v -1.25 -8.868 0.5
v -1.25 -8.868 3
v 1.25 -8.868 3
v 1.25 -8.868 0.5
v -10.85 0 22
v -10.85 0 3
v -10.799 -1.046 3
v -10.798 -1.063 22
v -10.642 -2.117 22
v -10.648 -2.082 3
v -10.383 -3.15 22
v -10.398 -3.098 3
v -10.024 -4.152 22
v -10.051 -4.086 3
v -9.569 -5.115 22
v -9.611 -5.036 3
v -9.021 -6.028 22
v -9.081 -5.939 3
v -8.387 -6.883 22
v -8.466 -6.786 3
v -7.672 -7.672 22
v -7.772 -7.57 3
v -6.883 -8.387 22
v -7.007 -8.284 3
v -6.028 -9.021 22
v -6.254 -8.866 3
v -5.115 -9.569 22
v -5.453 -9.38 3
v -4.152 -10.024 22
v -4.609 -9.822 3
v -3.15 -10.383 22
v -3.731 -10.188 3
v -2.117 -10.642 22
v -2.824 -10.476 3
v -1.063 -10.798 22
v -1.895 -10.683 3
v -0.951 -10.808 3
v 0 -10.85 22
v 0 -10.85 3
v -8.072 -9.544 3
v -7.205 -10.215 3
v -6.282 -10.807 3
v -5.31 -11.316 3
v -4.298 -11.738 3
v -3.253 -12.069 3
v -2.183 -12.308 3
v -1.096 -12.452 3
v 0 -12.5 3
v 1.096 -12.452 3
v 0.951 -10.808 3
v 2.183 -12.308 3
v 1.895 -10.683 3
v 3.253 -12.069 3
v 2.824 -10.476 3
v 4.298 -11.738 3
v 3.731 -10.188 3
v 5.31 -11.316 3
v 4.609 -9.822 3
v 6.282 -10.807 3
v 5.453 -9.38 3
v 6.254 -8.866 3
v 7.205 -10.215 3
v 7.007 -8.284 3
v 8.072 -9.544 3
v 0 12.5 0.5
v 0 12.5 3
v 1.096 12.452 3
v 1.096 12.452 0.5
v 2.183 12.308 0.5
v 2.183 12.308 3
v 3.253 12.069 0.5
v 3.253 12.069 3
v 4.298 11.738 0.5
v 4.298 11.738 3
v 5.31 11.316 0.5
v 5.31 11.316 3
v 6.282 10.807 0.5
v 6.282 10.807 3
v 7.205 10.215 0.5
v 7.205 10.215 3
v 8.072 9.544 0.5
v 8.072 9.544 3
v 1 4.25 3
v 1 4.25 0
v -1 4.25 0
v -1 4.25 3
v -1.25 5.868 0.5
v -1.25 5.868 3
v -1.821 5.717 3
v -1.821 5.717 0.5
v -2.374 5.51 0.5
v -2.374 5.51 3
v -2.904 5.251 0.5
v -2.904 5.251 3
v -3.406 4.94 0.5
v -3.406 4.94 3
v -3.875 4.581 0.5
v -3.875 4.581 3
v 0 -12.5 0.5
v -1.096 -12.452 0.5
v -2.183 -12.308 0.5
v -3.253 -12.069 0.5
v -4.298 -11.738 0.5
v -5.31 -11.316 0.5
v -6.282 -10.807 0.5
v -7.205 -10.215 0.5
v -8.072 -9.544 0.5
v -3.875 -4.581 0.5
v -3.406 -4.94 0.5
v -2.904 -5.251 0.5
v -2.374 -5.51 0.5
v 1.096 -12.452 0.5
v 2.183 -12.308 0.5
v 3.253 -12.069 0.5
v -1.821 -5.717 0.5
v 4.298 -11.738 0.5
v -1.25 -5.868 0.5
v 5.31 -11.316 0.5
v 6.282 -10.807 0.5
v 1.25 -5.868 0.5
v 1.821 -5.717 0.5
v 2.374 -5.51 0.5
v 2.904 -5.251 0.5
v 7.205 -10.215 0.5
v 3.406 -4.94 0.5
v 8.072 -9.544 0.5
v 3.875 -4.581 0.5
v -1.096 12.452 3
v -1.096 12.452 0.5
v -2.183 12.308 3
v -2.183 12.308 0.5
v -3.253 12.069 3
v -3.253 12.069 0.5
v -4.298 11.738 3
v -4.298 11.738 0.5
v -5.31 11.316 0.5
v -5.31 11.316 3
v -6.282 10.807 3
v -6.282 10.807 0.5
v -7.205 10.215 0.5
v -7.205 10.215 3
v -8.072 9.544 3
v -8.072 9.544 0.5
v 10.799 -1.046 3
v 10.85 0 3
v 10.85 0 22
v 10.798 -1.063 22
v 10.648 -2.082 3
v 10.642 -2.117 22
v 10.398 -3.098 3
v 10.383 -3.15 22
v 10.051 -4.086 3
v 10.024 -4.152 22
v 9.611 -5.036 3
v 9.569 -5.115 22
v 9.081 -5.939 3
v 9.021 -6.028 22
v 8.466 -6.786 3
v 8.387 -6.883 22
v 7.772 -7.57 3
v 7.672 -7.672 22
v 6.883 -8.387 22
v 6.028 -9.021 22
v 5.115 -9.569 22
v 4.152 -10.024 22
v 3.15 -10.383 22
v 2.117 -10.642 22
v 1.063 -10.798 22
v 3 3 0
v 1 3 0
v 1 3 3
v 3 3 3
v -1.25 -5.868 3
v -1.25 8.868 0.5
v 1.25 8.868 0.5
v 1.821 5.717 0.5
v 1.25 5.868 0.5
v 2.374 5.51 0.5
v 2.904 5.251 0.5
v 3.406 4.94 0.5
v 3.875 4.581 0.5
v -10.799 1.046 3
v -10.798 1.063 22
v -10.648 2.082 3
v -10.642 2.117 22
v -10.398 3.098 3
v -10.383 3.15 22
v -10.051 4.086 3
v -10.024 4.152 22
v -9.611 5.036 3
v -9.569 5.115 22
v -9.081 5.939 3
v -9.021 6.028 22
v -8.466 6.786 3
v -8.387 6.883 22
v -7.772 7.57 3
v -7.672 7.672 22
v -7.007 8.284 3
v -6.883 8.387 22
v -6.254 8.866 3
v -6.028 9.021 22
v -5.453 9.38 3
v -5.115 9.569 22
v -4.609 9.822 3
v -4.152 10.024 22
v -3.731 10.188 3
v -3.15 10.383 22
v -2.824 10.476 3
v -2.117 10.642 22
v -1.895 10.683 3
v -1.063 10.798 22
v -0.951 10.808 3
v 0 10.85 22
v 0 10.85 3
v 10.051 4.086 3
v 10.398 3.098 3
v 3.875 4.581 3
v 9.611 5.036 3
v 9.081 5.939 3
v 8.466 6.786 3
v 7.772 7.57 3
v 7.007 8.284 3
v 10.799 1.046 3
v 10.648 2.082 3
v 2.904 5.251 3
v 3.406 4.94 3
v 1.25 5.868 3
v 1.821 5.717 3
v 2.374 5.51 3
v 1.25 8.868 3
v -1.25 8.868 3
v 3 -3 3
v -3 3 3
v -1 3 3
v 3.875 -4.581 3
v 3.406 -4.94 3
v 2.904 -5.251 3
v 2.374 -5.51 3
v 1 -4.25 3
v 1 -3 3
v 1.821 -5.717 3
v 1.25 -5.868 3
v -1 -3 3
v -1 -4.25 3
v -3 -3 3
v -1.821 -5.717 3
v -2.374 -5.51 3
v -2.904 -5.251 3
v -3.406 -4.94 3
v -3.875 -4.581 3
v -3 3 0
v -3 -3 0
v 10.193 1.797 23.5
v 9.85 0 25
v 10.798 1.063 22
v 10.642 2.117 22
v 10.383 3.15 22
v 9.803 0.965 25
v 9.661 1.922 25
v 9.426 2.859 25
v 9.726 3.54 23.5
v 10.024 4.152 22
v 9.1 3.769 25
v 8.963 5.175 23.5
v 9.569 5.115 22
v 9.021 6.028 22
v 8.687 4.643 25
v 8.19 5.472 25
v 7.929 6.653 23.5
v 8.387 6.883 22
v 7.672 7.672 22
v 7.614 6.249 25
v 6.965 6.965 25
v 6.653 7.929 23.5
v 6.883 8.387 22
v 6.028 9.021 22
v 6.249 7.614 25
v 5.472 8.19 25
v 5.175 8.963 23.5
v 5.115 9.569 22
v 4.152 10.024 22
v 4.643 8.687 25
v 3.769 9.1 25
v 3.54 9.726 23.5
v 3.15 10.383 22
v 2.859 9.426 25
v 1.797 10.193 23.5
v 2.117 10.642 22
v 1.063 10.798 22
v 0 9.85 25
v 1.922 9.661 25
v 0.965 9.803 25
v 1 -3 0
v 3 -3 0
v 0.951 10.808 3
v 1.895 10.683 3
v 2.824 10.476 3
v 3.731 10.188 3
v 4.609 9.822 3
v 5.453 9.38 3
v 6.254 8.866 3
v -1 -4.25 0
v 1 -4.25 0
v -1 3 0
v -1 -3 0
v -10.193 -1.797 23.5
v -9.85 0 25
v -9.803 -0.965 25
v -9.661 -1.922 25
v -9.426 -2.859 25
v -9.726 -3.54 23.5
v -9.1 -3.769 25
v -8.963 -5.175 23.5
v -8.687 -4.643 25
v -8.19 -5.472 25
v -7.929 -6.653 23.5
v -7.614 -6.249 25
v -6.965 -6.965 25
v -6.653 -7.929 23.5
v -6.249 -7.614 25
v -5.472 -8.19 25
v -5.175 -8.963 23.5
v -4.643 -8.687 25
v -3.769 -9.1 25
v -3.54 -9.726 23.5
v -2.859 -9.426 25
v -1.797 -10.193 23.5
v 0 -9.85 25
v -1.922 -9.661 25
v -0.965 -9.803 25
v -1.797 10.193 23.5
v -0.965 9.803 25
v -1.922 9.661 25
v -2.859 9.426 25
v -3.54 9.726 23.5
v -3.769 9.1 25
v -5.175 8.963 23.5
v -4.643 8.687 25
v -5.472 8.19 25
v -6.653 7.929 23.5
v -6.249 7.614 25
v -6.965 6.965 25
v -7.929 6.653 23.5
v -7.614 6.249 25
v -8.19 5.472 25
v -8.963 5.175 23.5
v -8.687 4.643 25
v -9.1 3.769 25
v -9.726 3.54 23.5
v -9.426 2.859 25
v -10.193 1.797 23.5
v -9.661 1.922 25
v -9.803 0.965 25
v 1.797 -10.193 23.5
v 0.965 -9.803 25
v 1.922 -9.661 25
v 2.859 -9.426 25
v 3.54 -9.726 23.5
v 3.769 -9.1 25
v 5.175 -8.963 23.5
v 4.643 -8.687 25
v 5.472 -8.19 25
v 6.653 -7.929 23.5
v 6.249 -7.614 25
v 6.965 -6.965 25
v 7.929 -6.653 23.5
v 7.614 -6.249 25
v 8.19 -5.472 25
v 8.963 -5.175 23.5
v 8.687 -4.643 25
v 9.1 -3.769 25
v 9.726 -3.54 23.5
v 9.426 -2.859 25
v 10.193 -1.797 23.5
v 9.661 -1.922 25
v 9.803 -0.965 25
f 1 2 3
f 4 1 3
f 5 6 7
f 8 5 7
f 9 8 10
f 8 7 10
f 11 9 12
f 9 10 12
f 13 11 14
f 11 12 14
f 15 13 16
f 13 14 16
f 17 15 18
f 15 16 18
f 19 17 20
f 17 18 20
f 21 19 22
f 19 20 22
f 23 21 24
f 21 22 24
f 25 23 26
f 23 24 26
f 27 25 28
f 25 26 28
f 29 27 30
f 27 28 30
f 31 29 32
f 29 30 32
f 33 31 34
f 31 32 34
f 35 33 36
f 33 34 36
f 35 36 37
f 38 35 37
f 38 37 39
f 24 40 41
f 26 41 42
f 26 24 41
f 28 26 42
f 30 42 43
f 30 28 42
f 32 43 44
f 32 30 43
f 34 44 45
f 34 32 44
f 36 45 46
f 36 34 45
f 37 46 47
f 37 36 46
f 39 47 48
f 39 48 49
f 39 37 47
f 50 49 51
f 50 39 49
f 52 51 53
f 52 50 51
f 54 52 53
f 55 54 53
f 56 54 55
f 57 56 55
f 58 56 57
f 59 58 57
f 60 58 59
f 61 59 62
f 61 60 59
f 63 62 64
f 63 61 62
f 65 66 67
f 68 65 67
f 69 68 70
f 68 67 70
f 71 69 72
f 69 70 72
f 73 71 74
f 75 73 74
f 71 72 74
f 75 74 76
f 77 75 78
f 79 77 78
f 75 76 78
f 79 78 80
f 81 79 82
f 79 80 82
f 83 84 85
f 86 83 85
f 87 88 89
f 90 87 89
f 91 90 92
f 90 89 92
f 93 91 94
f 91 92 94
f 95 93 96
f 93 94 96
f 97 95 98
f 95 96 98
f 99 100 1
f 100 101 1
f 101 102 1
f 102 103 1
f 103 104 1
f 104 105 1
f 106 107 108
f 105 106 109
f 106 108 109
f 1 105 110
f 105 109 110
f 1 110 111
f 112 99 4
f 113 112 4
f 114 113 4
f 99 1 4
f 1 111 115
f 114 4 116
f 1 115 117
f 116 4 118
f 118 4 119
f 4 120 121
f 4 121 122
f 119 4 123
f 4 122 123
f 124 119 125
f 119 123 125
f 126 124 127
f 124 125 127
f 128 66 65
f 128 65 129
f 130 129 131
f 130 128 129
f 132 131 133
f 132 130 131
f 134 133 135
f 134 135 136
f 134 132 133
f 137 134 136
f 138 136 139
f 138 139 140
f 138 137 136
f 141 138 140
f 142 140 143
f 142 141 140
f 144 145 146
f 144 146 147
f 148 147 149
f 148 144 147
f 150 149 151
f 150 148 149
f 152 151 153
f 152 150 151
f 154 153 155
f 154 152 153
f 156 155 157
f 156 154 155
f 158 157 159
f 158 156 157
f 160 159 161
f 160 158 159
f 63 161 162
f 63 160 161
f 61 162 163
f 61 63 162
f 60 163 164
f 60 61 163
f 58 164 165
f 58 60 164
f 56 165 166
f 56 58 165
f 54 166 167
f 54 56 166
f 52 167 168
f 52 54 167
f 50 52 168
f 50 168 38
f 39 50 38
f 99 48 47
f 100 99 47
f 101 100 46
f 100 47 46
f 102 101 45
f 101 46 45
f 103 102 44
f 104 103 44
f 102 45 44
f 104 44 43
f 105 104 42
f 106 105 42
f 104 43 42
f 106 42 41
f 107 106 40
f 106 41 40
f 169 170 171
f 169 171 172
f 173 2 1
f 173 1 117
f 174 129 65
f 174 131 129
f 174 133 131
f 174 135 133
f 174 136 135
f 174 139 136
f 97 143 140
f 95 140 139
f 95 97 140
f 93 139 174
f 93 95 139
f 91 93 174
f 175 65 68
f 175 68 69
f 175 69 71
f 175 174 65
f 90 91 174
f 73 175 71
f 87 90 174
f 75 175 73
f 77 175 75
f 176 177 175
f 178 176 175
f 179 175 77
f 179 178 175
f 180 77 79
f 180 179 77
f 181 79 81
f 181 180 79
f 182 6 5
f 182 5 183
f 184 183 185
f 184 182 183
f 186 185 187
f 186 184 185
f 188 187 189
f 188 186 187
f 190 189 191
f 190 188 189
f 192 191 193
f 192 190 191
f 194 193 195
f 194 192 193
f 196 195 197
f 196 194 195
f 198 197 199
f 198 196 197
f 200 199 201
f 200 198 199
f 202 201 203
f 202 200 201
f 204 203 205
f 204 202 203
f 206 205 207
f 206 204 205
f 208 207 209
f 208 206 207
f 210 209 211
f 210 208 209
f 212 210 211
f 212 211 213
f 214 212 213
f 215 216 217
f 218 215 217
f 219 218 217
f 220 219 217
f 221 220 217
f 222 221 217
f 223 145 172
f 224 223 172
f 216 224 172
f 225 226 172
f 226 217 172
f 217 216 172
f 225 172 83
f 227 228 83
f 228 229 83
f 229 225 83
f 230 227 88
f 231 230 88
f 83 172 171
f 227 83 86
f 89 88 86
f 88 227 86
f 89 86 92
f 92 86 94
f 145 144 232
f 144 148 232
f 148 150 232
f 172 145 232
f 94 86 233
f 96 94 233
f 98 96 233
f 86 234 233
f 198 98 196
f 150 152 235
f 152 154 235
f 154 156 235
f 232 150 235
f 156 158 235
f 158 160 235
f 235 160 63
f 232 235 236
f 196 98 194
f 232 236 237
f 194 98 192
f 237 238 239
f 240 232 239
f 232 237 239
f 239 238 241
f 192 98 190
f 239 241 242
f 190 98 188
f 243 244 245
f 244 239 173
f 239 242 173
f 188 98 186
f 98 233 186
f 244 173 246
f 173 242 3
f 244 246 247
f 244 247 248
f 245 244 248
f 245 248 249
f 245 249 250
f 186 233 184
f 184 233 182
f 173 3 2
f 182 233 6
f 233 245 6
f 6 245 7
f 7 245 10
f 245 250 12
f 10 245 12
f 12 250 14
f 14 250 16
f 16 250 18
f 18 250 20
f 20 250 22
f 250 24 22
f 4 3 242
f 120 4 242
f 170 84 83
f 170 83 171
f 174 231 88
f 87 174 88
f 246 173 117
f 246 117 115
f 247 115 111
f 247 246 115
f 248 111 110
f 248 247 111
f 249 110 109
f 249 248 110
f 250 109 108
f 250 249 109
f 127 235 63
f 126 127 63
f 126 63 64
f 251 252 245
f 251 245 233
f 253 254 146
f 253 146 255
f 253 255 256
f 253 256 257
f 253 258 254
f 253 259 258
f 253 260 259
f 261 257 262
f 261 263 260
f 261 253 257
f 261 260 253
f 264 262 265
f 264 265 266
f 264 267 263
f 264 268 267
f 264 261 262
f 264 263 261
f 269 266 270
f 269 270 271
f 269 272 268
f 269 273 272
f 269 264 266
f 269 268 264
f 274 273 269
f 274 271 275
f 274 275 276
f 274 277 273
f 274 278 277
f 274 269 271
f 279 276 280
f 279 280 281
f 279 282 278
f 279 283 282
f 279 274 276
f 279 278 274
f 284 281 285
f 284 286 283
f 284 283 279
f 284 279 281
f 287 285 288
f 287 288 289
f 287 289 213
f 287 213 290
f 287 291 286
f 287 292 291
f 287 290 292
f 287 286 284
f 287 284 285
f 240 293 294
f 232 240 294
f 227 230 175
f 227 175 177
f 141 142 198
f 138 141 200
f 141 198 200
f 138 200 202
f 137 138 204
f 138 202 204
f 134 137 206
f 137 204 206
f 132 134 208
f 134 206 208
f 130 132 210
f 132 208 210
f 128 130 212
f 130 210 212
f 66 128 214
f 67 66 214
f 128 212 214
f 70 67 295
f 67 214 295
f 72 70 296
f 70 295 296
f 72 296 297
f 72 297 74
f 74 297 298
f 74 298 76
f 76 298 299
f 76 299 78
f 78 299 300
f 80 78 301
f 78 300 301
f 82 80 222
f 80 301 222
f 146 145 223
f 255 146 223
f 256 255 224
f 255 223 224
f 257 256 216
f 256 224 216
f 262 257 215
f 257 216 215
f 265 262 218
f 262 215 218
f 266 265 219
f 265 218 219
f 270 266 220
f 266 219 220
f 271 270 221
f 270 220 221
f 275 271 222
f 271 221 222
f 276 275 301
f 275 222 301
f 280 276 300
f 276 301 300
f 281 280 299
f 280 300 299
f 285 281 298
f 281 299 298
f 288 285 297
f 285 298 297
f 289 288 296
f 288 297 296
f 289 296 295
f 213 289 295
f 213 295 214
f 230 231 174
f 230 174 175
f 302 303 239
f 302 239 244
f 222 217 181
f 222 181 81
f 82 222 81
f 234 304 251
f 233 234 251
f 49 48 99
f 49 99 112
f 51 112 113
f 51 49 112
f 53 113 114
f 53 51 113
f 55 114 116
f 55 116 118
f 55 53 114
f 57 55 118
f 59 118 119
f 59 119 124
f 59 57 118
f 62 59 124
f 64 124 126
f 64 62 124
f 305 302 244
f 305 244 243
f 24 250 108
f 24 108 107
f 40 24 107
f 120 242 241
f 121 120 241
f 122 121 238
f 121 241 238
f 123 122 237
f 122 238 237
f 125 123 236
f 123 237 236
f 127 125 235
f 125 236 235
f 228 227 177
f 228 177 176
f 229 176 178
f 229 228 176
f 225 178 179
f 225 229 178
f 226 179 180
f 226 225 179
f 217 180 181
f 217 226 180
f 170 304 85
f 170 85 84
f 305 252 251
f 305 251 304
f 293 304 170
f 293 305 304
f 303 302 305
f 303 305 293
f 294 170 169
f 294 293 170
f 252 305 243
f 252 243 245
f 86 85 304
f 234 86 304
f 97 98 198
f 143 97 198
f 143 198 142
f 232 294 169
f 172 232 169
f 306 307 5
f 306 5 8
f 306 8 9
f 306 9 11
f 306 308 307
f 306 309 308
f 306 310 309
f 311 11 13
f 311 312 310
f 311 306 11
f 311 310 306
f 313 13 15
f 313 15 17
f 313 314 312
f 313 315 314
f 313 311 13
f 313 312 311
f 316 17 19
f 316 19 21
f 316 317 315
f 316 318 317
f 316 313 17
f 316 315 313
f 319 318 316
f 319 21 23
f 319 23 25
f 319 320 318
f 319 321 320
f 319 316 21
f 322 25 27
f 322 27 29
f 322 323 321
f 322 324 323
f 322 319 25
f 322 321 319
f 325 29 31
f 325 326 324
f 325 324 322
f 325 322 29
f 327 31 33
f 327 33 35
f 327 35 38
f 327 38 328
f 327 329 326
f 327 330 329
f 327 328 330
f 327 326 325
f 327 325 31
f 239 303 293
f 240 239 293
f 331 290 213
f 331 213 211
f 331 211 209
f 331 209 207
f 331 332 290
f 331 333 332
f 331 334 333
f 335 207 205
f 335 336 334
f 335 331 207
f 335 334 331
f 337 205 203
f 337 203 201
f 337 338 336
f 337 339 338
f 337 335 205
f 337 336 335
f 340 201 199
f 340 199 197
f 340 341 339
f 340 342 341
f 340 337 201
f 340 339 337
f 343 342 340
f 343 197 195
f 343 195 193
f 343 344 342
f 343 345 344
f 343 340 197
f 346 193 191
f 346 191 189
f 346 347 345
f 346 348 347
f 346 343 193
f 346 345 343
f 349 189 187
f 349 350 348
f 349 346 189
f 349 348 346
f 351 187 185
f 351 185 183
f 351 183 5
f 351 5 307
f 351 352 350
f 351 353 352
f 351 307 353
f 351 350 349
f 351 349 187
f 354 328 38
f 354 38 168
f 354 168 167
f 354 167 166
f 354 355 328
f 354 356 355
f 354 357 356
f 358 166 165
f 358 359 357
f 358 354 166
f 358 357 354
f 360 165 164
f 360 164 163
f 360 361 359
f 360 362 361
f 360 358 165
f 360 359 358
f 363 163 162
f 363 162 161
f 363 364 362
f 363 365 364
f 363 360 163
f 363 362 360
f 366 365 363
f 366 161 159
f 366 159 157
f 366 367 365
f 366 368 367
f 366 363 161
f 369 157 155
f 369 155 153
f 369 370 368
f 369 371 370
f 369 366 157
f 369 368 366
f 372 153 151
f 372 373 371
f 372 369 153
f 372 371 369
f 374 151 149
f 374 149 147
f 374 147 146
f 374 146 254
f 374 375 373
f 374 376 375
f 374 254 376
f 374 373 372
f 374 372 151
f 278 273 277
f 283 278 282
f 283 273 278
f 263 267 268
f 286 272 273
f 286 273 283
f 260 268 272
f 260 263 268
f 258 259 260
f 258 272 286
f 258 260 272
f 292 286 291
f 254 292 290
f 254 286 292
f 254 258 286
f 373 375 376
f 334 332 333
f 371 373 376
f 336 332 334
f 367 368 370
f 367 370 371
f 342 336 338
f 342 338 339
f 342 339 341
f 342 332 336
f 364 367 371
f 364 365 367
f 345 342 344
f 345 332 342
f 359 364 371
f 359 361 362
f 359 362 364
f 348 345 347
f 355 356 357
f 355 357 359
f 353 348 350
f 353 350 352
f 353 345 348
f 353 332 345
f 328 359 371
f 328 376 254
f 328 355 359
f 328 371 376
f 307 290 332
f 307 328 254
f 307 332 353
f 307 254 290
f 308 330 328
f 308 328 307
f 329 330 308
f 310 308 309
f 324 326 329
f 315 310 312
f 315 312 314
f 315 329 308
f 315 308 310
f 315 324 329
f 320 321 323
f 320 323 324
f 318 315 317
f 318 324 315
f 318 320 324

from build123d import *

# Parameters (mm, degrees)
PAD_DEPTH               = 3
PAD001_DEPTH            = 2
PAD002_DEPTH            = 20
PAD003_DEPTH            = 2.5
PAD_MIRRORED_2_DEPTH    = 3
PAD001_MIRRORED_2_DEPTH = 2
PAD002_MIRRORED_2_DEPTH = 20
PAD003_MIRRORED_2_DEPTH = 2.5
CHAMFER_SIZE2           = 1
CHAMFER_SIZE            = 3


with BuildPart() as part:
    # Sketch → Pad (new body)
    with BuildSketch(Plane.XY):
        Polygon((0, 4.25), (1, 4.25), (1, 3), (3, 3), (3, 0), (0, 0), align=None)
    pad = extrude(amount=PAD_DEPTH)

    # Sketch001 (on Face8 of Pad) → Pad001 (join)
    with BuildSketch(Plane.XY.offset(3)):
        with BuildLine():
            ThreePointArc((10.85, 0), (7.672109, 7.672109), (0, 10.85))
            Line((0, 10.85), (0, 0))
            Line((0, 0), (10.85, 0))
        make_face()
    pad001 = extrude(amount=PAD001_DEPTH)

    # Sketch002 (on Face12 of Pad001) → Pad002 (join)
    with BuildSketch(Plane.XY.offset(5)):
        with BuildLine():
            ThreePointArc((10.85, 0), (7.672109, 7.672109), (0, 10.85))
            Line((0, 0), (0, 10.85))
            Line((0, 0), (10.85, 0))
        make_face()
    pad002 = extrude(amount=PAD002_DEPTH)

    # Sketch003 (on Face5 of Pad002) → Pad003 (join)
    with BuildSketch(Plane(origin=(0, 0, 3), x_dir=(1, 0, 0), z_dir=(0, 0, -1))):
        with BuildLine():
            ThreePointArc((1.25, -5.868347), (2.641923, -5.387044), (3.874663, -4.581156))
            Line((3.874663, -4.581156), (8.072214, -9.544074))
            ThreePointArc((0, -12.5), (4.298201, -11.737779), (8.072214, -9.544074))
            Line((0, -8.868347), (0, -12.5))
            Line((1.25, -8.868347), (0, -8.868347))
            Line((1.25, -8.868347), (1.25, -5.868347))
        make_face()
    pad003 = extrude(amount=PAD003_DEPTH)

    # Sketch Mirrored 2 → Pad Mirrored 2 (add)
    with BuildSketch(Plane(origin=(0, 0, 0), x_dir=(-1, 0, 0), z_dir=(0, 0, -1))):
        Polygon((0, 4.25), (1, 4.25), (1, 3), (3, 3), (3, 0), (0, 0), align=None)
    pad_mirrored_2 = extrude(amount=-PAD_MIRRORED_2_DEPTH)

    # Sketch001 Mirrored 2 → Pad001 Mirrored 2 (add)
    with BuildSketch(Plane(origin=(0, 0, 3), x_dir=(-1, 0, 0), z_dir=(0, 0, -1))):
        with BuildLine():
            ThreePointArc((10.85, 0), (7.672109, 7.672109), (0, 10.85))
            Line((0, 10.85), (0, 0))
            Line((0, 0), (10.85, 0))
        make_face()
    pad001_mirrored_2 = extrude(amount=-PAD001_MIRRORED_2_DEPTH)

    # Sketch002 Mirrored 2 → Pad002 Mirrored 2 (add)
    with BuildSketch(Plane(origin=(0, 0, 5), x_dir=(-1, 0, 0), z_dir=(0, 0, -1))):
        with BuildLine():
            ThreePointArc((10.85, 0), (7.672109, 7.672109), (0, 10.85))
            Line((0, 0), (0, 10.85))
            Line((0, 0), (10.85, 0))
        make_face()
    pad002_mirrored_2 = extrude(amount=-PAD002_MIRRORED_2_DEPTH)

    # Sketch003 Mirrored 2 → Pad003 Mirrored 2 (add)
    with BuildSketch(Plane(origin=(0, 0, 3), x_dir=(-1, 0, 0), z_dir=(0, 0, 1))):
        with BuildLine():
            ThreePointArc((1.25, -5.868347), (2.641923, -5.387044), (3.874663, -4.581156))
            Line((3.874663, -4.581156), (8.072214, -9.544074))
            ThreePointArc((0, -12.5), (4.298201, -11.737779), (8.072214, -9.544074))
            Line((0, -8.868347), (0, -12.5))
            Line((1.25, -8.868347), (0, -8.868347))
            Line((1.25, -8.868347), (1.25, -5.868347))
        make_face()
    pad003_mirrored_2 = extrude(amount=-PAD003_MIRRORED_2_DEPTH)

    # Mirrored001: Pad, Pad001, Pad002, Pad003, Pad Mirrored 2, Pad001 Mirrored 2, Pad002 Mirrored 2, Pad003 Mirrored 2 across Sketch H_Axis
    add(pad.mirror(Plane.ZX))
    add(pad001.mirror(Plane.ZX))
    add(pad002.mirror(Plane.ZX))
    add(pad003.mirror(Plane.ZX))
    add(pad_mirrored_2.mirror(Plane.ZX))
    add(pad001_mirrored_2.mirror(Plane.ZX))
    add(pad002_mirrored_2.mirror(Plane.ZX))
    add(pad003_mirrored_2.mirror(Plane.ZX))

    # Chamfer
    chamfer_edges = [part.edges().sort_by_distance(p)[0] for p in [
        (-7.672109, -7.672109, 25),
    ]]
    chamfer_side = part.faces().sort_by_distance((-7.672109, -7.672109, 15))[0]
    chamfer(chamfer_edges, length=CHAMFER_SIZE, length2=CHAMFER_SIZE2, reference=chamfer_side)


solid = part.part
